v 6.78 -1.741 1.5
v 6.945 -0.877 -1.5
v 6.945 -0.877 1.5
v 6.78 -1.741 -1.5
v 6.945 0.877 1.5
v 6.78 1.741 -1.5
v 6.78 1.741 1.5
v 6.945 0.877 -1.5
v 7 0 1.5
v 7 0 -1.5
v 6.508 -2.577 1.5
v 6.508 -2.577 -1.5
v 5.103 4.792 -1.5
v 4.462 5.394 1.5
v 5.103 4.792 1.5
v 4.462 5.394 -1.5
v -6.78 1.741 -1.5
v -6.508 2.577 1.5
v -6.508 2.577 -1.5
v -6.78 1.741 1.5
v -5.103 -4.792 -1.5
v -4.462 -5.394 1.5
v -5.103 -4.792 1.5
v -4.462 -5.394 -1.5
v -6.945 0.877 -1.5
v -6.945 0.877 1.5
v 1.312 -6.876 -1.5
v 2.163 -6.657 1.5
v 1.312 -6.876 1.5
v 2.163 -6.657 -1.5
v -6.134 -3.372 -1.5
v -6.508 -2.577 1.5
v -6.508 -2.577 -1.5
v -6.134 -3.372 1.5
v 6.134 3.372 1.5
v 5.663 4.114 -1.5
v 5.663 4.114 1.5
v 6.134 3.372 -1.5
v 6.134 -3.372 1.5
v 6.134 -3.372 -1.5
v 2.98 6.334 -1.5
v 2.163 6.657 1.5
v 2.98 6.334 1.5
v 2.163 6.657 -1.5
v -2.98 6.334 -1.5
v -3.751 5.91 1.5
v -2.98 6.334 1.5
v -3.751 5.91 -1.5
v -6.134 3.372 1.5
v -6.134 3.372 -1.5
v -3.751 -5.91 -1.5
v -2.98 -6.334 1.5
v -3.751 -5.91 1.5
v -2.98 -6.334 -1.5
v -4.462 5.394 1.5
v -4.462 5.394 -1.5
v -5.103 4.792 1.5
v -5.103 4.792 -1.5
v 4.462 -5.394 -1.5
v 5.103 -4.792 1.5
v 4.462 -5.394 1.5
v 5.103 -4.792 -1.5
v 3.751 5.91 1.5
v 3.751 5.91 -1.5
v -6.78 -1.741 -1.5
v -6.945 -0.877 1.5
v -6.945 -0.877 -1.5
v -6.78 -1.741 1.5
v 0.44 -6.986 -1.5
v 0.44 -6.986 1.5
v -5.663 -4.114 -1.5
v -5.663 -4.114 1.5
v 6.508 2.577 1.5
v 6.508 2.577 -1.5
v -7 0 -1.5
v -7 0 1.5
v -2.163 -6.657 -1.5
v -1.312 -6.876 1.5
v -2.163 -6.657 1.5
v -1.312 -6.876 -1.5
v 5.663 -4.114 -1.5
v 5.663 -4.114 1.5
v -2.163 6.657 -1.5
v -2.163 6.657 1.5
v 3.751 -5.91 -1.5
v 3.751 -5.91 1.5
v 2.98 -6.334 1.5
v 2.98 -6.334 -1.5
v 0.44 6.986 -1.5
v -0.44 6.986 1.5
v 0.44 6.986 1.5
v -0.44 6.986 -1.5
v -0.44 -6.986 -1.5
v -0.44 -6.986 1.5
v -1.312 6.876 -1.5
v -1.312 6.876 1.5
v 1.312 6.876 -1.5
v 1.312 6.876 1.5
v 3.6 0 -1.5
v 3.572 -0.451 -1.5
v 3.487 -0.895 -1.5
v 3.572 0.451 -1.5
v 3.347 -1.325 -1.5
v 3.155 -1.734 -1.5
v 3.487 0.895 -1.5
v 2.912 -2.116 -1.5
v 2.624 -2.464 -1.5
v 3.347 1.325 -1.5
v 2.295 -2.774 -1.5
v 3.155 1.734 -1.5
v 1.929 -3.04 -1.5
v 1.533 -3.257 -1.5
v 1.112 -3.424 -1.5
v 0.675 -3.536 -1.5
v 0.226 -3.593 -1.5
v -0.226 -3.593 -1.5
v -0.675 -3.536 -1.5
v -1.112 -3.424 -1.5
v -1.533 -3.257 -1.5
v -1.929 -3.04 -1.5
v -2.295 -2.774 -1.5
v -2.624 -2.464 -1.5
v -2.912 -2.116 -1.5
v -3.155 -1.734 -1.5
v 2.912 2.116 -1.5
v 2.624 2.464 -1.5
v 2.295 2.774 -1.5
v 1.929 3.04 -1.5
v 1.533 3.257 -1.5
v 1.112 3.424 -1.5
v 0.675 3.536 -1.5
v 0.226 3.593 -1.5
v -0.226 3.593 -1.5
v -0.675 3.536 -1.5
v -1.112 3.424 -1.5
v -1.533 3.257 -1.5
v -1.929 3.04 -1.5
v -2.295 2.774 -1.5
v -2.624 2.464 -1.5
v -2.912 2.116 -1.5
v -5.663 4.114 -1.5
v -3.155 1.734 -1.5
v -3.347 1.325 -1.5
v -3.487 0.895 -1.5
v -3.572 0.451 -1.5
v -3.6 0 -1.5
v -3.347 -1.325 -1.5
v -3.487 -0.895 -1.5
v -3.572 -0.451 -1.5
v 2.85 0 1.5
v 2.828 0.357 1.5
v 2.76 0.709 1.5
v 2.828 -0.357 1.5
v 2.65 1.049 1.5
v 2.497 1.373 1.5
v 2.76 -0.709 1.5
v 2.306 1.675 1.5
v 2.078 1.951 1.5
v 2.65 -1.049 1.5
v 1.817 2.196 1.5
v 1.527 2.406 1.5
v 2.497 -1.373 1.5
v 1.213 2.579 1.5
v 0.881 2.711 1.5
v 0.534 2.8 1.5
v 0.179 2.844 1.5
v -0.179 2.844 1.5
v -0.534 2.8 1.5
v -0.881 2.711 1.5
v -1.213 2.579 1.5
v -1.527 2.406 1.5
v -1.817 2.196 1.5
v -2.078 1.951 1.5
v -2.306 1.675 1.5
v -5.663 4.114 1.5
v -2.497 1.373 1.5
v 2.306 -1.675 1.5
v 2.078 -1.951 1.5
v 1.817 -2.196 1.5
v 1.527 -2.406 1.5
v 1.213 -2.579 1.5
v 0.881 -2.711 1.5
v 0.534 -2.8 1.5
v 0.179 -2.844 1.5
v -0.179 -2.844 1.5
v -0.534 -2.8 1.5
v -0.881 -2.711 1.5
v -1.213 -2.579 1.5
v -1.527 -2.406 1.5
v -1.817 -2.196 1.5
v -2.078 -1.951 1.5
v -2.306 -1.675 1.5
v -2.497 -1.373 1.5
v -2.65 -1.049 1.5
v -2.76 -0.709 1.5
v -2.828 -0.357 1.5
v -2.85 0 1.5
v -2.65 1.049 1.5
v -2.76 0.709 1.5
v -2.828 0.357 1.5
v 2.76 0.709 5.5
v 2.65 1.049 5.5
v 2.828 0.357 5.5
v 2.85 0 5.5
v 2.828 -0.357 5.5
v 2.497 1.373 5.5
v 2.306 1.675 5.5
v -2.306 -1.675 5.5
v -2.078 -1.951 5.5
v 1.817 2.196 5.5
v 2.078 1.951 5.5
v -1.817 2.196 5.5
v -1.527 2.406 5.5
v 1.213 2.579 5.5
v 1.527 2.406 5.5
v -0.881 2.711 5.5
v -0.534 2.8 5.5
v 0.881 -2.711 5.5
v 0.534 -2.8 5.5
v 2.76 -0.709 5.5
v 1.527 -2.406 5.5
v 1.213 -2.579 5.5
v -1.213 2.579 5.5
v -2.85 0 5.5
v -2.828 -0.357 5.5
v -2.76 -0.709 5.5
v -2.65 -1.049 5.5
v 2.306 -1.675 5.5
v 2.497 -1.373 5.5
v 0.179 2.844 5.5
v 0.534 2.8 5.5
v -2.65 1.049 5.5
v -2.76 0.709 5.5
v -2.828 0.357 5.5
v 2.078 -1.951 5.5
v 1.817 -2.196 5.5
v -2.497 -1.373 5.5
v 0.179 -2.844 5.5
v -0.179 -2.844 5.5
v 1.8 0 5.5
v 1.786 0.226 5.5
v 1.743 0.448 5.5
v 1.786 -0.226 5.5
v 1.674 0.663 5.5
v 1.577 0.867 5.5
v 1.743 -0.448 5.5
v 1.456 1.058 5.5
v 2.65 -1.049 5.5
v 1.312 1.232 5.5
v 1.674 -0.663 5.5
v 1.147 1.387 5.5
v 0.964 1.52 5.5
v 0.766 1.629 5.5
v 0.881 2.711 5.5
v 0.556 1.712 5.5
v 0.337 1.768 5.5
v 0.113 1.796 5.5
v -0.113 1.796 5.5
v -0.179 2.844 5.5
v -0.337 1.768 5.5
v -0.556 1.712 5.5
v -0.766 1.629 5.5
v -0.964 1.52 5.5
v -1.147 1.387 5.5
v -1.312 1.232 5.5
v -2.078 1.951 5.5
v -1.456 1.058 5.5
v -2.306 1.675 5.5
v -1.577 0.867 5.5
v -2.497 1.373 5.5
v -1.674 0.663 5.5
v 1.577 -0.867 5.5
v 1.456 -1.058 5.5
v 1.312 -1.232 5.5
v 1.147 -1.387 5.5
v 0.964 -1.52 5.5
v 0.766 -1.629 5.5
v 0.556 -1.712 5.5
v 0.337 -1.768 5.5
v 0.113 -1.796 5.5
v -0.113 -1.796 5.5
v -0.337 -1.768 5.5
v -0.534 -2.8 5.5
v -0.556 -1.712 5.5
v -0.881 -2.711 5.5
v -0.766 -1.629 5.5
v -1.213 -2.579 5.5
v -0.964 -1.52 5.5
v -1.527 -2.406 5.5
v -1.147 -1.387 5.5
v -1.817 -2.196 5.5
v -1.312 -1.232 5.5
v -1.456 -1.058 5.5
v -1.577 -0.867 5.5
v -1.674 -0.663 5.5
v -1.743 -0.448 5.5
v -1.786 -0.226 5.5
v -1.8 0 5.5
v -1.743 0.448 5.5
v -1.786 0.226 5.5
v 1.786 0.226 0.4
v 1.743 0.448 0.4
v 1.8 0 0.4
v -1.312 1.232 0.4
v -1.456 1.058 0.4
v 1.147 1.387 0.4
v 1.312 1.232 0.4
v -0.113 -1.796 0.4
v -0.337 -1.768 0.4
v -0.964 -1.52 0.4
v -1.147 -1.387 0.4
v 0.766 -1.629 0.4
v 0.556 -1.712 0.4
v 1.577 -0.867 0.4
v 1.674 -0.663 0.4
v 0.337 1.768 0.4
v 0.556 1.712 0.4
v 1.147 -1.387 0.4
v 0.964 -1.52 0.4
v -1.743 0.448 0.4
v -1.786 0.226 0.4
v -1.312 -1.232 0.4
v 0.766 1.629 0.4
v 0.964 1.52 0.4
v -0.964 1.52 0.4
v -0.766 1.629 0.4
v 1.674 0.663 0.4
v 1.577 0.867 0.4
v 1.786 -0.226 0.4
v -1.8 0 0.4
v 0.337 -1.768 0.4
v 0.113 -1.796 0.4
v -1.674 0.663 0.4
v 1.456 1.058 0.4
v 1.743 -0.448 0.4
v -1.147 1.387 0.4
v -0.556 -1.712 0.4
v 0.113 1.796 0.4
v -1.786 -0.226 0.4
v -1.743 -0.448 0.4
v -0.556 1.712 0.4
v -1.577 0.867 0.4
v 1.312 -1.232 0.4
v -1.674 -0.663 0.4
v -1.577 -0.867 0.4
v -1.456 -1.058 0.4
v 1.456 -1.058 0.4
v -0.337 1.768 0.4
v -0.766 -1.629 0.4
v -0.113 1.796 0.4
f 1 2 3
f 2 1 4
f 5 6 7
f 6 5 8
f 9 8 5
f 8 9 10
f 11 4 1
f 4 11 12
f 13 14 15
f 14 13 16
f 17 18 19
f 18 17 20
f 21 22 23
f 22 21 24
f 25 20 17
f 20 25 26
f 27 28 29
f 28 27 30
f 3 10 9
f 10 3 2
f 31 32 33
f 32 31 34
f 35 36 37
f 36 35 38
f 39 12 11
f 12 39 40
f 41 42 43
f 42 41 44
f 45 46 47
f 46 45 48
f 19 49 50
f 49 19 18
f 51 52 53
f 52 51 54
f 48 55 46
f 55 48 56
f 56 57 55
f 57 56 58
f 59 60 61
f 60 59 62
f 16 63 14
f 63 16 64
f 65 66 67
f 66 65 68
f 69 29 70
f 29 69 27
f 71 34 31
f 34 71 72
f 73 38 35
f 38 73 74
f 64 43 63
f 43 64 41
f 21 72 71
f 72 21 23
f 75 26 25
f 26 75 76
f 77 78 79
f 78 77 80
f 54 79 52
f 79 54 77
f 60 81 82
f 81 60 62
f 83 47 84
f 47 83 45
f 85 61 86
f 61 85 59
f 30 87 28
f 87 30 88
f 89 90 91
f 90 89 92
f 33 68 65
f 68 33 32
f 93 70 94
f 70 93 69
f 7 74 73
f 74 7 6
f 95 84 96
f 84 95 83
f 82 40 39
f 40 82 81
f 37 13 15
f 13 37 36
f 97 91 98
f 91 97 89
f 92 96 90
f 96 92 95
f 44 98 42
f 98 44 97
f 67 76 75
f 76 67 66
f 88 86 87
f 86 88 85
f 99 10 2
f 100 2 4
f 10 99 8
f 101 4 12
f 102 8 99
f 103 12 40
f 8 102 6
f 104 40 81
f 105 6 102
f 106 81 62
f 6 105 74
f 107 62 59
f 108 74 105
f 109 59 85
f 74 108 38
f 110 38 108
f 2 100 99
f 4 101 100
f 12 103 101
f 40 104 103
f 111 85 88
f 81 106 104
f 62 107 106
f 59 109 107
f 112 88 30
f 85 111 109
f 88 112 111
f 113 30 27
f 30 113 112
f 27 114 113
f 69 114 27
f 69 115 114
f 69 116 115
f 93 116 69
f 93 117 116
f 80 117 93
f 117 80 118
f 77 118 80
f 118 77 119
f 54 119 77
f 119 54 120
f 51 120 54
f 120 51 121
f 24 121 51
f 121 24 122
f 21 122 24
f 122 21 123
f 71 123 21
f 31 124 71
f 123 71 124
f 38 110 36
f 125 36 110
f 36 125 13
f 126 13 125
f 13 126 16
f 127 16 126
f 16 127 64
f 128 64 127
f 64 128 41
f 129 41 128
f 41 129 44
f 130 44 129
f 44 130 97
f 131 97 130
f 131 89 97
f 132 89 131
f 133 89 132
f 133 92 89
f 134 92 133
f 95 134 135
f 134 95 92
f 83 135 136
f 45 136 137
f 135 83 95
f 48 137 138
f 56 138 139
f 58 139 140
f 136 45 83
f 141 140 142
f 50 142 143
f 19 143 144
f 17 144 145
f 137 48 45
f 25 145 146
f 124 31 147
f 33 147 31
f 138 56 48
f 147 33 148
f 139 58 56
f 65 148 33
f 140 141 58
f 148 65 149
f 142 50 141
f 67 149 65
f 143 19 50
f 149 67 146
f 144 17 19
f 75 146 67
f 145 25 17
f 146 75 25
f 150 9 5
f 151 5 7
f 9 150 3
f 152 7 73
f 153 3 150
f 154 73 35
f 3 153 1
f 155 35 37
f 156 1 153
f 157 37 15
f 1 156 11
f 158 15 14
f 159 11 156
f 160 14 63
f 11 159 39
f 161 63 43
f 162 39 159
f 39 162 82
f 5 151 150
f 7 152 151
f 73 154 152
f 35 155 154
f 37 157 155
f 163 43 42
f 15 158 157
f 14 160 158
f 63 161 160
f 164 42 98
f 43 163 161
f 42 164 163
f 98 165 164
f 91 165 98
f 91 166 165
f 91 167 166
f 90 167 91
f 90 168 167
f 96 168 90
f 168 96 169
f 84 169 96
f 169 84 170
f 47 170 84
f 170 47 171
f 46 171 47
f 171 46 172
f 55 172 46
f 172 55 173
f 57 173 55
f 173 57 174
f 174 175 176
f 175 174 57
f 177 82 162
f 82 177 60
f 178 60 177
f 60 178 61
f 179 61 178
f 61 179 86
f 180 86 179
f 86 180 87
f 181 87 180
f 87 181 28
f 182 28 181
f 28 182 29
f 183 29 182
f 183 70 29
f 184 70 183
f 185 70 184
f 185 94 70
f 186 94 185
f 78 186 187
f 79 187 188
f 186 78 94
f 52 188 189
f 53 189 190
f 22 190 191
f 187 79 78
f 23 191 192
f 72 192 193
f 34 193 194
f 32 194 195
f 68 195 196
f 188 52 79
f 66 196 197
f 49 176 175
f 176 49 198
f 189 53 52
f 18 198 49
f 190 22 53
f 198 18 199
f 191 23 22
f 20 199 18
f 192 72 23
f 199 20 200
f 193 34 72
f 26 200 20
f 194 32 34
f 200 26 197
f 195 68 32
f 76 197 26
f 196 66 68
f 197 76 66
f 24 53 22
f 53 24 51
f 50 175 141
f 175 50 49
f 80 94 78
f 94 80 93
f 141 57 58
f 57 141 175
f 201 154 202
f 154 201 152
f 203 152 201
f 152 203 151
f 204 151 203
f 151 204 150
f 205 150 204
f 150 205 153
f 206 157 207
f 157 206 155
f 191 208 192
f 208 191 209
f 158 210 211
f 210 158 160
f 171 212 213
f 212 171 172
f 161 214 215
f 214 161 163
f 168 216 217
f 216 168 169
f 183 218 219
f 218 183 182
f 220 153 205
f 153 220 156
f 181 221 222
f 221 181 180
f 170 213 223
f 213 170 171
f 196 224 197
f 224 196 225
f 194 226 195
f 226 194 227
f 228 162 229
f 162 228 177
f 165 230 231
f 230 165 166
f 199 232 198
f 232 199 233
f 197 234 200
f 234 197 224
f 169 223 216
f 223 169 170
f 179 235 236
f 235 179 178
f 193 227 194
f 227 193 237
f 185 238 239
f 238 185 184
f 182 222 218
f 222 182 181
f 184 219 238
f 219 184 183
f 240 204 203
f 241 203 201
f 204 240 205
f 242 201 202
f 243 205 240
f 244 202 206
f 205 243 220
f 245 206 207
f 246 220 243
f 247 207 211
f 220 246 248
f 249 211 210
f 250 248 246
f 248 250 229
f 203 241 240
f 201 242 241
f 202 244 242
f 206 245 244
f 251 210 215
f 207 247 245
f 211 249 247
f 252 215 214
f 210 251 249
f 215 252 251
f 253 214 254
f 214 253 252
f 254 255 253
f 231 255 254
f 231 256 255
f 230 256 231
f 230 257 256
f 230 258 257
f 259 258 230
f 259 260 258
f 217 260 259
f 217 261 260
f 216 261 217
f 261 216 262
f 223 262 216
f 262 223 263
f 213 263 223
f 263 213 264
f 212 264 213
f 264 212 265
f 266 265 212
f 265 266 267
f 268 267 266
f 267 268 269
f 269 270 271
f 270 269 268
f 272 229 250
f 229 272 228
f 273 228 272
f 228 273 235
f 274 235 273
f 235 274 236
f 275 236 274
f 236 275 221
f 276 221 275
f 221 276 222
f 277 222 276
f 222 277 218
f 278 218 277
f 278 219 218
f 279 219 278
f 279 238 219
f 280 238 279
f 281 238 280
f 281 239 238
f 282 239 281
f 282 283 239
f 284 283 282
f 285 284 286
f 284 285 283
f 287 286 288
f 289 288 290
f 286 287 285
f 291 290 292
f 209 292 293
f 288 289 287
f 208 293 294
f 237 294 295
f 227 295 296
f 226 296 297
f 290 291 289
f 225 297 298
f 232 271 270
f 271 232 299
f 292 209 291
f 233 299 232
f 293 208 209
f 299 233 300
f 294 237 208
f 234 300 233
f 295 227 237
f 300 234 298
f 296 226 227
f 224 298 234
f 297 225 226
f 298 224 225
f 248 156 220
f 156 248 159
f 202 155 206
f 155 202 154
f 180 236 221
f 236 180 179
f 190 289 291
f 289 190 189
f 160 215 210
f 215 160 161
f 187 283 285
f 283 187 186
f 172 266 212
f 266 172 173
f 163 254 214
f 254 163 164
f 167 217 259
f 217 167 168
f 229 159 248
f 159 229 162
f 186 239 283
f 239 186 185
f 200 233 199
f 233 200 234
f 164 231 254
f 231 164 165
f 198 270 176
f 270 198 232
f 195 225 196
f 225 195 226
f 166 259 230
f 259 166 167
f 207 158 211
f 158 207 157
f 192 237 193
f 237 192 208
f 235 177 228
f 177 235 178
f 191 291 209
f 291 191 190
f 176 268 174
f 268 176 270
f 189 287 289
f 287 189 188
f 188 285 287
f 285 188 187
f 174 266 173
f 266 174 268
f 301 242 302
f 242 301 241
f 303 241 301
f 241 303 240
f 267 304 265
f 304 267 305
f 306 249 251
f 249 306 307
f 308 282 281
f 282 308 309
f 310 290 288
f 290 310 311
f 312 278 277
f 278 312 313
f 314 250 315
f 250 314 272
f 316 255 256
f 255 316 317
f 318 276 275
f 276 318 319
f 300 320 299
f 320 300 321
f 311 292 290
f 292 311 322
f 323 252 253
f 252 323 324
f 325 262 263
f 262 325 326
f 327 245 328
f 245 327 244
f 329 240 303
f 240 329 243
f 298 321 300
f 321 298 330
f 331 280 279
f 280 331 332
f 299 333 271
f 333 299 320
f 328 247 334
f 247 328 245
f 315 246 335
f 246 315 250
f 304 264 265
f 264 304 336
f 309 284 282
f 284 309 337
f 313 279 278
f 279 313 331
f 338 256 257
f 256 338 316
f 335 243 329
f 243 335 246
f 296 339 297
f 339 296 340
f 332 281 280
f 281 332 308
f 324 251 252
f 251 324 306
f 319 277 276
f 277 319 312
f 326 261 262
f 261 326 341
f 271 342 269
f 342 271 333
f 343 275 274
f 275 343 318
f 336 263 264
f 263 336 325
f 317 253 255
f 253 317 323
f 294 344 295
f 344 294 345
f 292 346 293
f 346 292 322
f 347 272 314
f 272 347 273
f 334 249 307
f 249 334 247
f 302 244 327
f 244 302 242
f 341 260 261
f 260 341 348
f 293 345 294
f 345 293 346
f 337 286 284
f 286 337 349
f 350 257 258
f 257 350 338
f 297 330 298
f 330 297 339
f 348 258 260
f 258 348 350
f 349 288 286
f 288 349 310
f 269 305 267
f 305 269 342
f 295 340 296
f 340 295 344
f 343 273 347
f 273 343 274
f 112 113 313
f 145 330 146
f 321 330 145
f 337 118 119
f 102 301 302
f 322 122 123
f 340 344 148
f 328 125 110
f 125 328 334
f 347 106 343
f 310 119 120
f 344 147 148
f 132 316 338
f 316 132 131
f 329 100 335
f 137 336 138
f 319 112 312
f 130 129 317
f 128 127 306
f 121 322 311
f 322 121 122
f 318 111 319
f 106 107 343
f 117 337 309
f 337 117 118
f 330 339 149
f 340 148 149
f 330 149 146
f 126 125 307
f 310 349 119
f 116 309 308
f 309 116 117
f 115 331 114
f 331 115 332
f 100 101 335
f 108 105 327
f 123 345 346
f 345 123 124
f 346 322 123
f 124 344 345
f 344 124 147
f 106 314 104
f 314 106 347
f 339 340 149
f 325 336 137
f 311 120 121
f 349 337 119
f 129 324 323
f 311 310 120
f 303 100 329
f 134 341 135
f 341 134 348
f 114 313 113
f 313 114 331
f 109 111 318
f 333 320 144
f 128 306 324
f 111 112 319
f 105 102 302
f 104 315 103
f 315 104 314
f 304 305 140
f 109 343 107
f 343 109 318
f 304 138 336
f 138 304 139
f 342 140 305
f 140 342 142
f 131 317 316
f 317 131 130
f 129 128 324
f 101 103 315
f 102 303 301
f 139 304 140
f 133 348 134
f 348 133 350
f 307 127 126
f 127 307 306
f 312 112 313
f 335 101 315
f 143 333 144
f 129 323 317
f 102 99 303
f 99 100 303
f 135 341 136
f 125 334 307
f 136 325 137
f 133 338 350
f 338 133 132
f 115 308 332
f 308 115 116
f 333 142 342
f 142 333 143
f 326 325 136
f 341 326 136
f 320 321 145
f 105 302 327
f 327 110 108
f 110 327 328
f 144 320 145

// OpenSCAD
$fn = 50;


difference() {
	union() {
		translate(v = [0, 0, -1.5000000000]) {
			rotate(a = [0, 0, 0]) {
				cylinder(h = 3, r = 7.0000000000);
			}
		}
		translate(v = [0, 0, -1.5000000000]) {
			rotate(a = [0, 0, 0]) {
				cylinder(h = 7, r = 2.8500000000);
			}
		}
	}
	union() {
		translate(v = [0, 0, -125.0000000000]) {
			rotate(a = [0, 0, 0]) {
				cylinder(h = 250, r = 1.8000000000);
			}
		}
		#translate(v = [0, 0, 0.4000000000]) {
			rotate(a = [0, 180, 0]) {
				cylinder(h = 1.9000000000, r1 = 1.8000000000, r2 = 3.6000000000);
			}
		}
		#translate(v = [0, 0, 5.5000000000]) {
			rotate(a = [0, 180, 0]) {
				cylinder(h = 7, r = 1.8000000000);
			}
		}
	}
}
